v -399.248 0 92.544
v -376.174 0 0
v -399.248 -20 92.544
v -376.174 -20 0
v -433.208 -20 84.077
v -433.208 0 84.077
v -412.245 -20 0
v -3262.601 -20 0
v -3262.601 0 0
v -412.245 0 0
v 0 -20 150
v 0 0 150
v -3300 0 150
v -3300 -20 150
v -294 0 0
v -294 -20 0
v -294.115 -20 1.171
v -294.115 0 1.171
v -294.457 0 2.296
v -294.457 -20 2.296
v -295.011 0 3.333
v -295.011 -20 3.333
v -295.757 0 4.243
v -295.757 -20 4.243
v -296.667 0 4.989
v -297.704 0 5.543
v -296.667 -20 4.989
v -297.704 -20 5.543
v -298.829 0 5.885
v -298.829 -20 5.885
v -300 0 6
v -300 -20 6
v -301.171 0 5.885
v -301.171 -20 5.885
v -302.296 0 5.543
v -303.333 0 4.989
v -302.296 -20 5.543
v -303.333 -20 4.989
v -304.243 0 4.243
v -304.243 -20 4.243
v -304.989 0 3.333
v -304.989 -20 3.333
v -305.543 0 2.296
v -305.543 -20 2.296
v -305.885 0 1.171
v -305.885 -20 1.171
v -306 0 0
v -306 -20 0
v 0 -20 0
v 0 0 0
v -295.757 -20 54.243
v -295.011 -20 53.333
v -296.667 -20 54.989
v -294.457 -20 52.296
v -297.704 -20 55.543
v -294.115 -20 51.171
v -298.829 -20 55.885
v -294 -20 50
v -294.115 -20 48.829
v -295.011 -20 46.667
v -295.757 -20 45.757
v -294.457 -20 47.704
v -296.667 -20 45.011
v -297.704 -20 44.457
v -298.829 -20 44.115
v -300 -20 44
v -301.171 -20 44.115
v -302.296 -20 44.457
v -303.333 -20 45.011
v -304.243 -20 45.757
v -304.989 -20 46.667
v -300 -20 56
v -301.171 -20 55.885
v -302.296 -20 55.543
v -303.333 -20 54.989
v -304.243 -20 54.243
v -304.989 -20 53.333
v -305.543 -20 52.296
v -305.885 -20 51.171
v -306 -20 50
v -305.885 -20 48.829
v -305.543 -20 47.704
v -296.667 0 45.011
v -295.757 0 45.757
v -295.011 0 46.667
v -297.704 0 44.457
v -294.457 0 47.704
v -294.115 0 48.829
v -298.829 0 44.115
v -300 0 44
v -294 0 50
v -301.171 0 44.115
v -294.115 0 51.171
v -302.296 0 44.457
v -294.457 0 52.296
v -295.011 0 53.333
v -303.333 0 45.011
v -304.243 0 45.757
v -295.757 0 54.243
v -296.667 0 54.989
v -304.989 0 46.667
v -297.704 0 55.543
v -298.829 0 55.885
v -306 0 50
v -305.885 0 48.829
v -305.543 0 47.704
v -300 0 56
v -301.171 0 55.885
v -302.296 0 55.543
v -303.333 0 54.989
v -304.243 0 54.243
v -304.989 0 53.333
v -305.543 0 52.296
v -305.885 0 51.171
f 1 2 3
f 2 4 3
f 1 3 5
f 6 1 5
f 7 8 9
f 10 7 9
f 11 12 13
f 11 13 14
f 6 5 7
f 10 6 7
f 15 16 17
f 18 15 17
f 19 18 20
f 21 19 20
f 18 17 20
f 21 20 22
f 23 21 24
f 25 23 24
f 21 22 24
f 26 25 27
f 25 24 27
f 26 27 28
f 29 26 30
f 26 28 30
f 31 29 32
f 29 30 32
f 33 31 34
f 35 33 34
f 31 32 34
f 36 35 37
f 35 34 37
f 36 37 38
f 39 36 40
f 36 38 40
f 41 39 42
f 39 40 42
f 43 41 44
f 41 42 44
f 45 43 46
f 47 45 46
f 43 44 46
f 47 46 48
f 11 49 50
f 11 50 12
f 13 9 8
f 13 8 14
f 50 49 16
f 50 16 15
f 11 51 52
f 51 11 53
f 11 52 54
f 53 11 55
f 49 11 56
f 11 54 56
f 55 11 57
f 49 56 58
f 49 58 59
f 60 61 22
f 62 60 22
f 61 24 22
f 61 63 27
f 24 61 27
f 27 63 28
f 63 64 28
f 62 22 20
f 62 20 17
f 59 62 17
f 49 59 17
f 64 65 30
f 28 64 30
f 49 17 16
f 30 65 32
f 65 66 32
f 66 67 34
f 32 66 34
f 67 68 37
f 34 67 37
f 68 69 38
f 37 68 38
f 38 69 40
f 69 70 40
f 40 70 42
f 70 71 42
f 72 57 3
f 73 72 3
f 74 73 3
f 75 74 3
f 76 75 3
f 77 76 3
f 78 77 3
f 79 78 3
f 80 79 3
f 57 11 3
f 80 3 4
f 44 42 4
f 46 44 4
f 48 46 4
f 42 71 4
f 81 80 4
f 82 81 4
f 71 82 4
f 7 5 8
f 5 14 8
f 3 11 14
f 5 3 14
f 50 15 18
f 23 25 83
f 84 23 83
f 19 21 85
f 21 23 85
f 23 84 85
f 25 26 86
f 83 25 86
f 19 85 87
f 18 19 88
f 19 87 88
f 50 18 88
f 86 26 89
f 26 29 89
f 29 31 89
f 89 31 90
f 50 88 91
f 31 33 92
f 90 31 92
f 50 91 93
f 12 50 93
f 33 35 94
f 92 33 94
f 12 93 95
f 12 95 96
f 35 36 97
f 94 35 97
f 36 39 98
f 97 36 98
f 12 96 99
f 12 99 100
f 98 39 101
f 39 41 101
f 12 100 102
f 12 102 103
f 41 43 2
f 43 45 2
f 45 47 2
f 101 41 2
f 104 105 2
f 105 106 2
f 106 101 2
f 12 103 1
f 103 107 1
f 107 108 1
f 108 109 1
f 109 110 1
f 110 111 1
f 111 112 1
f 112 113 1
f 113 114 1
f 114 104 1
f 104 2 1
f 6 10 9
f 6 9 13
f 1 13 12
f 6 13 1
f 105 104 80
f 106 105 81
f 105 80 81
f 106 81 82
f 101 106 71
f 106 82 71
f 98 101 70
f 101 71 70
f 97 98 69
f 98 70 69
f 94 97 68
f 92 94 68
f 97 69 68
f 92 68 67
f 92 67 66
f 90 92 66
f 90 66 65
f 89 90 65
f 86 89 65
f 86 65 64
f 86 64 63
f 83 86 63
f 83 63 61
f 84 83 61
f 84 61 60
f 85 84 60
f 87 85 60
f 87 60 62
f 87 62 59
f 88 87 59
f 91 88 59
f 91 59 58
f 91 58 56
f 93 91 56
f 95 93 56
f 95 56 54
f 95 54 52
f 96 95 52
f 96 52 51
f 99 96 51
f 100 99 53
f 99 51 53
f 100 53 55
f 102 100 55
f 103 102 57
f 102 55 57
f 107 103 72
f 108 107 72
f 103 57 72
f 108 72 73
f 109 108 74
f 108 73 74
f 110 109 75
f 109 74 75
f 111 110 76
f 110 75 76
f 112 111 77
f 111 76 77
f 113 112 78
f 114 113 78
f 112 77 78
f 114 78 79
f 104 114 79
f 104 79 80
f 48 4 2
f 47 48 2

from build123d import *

# Parameters (mm, degrees)
F0_W        = 20
F0_H        = 150
F3_T1_DEPTH = 799.1426747922
F11_D       = 12


# Not quite as in the source:
# - a fillet or chamfer that OpenCascade refuses, or shapes differently, is made with other operations: its cross-section is extruded or revolved along the edge and cut away or added
# - a feature of the source that left no trace in its solid (it failed there, or was rolled back) is left out


with BuildPart() as f2:
    # F2: sweep along a path in F1
    with BuildLine(Plane.XZ) as f2_path:
        Line((0, 0), (-3300, 0))
    # F0 (on Right) → F2 (sweep)
    with BuildSketch(Plane.YZ):
        with Locations((-10, 75)):
            Rectangle(F0_W, F0_H)
    sweep(path=f2_path.line)

    # F3: chamfer of 150 x 37.3992004265 on 1 edges, made by hand

    # F3_s2 → F3_t1 (cut)
    with BuildSketch(Plane.XZ.offset(-389.5713373961)):
        Polygon((-3262.6007995735, 0), (-3300, 150), (-3300, 0), align=None)
    extrude(amount=F3_T1_DEPTH, mode=Mode.SUBTRACT)

    # F9: sweep along a path in F8
    with BuildLine(Plane.XY) as f9_path:
        Line((-375.5503296852, 160.6018841267), (-375.5503296852, -268.9945995808))
    # F7 (on Front) → F9 (sweep, cut)
    with BuildSketch(Plane.XZ):
        Polygon((-399.247874902, 92.5443589414), (-433.2082253216, 84.0770925954), (-352.1368366165, -241.0824874784), (-362.959590562, -53), align=None)
    sweep(path=f9_path.line, mode=Mode.SUBTRACT)

    # F11 (through all)
    with Locations(Plane(origin=(0, 0, 0), x_dir=(1, 0, 0), z_dir=(0, 1, 0))):
        with Locations((-300, -50), (-300, 0)):
            Hole(F11_D / 2)


solid = f2.part
